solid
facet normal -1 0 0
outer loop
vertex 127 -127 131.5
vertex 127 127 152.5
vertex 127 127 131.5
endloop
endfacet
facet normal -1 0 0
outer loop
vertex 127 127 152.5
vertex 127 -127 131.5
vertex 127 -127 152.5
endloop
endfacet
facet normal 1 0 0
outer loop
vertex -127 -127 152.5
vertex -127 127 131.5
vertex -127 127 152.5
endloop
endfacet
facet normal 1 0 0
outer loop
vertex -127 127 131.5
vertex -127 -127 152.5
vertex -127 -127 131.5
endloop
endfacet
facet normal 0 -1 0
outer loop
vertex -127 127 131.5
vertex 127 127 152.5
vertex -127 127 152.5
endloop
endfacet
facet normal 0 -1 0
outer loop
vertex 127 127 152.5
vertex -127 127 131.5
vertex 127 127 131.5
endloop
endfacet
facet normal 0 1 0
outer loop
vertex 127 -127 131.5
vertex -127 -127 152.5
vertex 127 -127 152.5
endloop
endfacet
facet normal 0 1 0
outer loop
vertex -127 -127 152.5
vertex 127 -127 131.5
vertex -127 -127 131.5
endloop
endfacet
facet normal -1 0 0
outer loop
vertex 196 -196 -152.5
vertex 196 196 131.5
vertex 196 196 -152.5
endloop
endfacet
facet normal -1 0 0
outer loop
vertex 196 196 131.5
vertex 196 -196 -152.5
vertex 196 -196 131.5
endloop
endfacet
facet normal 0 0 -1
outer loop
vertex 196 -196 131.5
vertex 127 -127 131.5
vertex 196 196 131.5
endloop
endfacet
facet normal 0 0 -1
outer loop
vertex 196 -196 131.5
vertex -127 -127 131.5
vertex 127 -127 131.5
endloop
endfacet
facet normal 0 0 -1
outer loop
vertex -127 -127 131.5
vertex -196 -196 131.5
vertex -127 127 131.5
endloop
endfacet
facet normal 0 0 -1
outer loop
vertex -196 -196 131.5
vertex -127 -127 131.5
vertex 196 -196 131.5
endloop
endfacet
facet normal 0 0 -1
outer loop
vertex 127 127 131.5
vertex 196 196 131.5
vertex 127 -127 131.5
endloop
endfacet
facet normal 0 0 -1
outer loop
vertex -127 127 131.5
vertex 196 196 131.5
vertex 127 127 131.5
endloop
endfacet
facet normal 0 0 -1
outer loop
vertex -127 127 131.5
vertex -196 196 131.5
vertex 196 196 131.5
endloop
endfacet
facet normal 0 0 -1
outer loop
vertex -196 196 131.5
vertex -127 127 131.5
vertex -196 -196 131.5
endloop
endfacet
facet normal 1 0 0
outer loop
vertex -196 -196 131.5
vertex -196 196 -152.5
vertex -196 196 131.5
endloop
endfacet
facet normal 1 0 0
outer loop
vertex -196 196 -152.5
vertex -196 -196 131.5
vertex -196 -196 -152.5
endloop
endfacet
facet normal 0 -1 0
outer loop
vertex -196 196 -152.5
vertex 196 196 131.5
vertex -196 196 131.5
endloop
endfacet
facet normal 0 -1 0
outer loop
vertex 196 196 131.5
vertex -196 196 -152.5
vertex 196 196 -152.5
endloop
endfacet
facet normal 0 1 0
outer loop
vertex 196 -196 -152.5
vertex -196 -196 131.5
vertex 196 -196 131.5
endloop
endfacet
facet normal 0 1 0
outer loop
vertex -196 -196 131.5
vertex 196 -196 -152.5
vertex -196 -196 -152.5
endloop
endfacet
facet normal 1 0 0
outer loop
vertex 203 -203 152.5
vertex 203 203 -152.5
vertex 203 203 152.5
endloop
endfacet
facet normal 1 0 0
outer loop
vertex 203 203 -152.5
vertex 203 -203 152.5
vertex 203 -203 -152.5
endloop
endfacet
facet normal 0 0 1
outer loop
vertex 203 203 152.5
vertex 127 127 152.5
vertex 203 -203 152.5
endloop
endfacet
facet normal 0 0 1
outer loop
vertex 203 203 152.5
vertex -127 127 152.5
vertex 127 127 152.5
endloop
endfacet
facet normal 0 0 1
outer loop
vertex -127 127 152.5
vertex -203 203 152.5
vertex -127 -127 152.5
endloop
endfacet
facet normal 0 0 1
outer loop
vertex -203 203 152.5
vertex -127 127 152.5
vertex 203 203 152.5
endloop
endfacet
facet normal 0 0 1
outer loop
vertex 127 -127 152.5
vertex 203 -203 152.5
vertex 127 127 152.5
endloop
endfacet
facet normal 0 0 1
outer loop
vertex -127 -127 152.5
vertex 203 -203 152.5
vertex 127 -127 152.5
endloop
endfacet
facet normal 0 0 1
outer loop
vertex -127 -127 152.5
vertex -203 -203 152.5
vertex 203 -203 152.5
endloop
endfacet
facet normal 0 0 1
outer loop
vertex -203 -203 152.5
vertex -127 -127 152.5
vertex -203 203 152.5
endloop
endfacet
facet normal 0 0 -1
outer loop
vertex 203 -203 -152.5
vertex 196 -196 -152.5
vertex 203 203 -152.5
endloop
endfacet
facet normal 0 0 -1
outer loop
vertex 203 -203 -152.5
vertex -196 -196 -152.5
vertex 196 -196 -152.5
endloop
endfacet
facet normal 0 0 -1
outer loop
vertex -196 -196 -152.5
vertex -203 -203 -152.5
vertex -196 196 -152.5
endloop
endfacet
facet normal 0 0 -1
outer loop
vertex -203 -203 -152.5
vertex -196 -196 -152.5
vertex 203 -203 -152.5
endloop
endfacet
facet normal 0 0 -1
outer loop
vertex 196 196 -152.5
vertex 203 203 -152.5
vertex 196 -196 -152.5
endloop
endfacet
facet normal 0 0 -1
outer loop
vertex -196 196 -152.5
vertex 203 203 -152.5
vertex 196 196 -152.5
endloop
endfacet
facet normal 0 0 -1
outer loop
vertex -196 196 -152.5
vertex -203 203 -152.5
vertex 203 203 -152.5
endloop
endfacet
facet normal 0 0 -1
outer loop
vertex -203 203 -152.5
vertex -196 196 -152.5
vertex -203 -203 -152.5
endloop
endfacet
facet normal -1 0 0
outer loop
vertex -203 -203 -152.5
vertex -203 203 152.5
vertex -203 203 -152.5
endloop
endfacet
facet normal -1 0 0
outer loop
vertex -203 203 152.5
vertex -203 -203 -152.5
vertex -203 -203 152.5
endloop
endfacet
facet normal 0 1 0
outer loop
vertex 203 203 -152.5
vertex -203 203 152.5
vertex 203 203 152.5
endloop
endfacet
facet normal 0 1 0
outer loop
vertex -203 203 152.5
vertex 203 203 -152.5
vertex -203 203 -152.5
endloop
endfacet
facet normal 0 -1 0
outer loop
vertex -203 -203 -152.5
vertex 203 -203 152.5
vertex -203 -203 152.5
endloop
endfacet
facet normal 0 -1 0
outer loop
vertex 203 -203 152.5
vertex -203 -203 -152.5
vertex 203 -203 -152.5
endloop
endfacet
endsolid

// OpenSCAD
// Copyright (c) Microsoft Corporation. All rights reserved.
// Licensed under the MIT License.

wallThickness=14;
roofThickness=14;
cubeHeight=305;
cubeWidth=406;
cubeLength=406;
aperatureWidth=254;
aperatureLength=254; 

difference () {
  translate([0,0,0])
	cube ([cubeWidth,cubeLength,cubeHeight],center = true);
  union () {
    translate([0,0,roofThickness])
    cube ([aperatureWidth,aperatureLength,cubeHeight],center = true);
    translate([0,0,-roofThickness])
		cube ([cubeWidth-wallThickness,cubeLength-wallThickness,cubeHeight-roofThickness],center = true);
  }
}
